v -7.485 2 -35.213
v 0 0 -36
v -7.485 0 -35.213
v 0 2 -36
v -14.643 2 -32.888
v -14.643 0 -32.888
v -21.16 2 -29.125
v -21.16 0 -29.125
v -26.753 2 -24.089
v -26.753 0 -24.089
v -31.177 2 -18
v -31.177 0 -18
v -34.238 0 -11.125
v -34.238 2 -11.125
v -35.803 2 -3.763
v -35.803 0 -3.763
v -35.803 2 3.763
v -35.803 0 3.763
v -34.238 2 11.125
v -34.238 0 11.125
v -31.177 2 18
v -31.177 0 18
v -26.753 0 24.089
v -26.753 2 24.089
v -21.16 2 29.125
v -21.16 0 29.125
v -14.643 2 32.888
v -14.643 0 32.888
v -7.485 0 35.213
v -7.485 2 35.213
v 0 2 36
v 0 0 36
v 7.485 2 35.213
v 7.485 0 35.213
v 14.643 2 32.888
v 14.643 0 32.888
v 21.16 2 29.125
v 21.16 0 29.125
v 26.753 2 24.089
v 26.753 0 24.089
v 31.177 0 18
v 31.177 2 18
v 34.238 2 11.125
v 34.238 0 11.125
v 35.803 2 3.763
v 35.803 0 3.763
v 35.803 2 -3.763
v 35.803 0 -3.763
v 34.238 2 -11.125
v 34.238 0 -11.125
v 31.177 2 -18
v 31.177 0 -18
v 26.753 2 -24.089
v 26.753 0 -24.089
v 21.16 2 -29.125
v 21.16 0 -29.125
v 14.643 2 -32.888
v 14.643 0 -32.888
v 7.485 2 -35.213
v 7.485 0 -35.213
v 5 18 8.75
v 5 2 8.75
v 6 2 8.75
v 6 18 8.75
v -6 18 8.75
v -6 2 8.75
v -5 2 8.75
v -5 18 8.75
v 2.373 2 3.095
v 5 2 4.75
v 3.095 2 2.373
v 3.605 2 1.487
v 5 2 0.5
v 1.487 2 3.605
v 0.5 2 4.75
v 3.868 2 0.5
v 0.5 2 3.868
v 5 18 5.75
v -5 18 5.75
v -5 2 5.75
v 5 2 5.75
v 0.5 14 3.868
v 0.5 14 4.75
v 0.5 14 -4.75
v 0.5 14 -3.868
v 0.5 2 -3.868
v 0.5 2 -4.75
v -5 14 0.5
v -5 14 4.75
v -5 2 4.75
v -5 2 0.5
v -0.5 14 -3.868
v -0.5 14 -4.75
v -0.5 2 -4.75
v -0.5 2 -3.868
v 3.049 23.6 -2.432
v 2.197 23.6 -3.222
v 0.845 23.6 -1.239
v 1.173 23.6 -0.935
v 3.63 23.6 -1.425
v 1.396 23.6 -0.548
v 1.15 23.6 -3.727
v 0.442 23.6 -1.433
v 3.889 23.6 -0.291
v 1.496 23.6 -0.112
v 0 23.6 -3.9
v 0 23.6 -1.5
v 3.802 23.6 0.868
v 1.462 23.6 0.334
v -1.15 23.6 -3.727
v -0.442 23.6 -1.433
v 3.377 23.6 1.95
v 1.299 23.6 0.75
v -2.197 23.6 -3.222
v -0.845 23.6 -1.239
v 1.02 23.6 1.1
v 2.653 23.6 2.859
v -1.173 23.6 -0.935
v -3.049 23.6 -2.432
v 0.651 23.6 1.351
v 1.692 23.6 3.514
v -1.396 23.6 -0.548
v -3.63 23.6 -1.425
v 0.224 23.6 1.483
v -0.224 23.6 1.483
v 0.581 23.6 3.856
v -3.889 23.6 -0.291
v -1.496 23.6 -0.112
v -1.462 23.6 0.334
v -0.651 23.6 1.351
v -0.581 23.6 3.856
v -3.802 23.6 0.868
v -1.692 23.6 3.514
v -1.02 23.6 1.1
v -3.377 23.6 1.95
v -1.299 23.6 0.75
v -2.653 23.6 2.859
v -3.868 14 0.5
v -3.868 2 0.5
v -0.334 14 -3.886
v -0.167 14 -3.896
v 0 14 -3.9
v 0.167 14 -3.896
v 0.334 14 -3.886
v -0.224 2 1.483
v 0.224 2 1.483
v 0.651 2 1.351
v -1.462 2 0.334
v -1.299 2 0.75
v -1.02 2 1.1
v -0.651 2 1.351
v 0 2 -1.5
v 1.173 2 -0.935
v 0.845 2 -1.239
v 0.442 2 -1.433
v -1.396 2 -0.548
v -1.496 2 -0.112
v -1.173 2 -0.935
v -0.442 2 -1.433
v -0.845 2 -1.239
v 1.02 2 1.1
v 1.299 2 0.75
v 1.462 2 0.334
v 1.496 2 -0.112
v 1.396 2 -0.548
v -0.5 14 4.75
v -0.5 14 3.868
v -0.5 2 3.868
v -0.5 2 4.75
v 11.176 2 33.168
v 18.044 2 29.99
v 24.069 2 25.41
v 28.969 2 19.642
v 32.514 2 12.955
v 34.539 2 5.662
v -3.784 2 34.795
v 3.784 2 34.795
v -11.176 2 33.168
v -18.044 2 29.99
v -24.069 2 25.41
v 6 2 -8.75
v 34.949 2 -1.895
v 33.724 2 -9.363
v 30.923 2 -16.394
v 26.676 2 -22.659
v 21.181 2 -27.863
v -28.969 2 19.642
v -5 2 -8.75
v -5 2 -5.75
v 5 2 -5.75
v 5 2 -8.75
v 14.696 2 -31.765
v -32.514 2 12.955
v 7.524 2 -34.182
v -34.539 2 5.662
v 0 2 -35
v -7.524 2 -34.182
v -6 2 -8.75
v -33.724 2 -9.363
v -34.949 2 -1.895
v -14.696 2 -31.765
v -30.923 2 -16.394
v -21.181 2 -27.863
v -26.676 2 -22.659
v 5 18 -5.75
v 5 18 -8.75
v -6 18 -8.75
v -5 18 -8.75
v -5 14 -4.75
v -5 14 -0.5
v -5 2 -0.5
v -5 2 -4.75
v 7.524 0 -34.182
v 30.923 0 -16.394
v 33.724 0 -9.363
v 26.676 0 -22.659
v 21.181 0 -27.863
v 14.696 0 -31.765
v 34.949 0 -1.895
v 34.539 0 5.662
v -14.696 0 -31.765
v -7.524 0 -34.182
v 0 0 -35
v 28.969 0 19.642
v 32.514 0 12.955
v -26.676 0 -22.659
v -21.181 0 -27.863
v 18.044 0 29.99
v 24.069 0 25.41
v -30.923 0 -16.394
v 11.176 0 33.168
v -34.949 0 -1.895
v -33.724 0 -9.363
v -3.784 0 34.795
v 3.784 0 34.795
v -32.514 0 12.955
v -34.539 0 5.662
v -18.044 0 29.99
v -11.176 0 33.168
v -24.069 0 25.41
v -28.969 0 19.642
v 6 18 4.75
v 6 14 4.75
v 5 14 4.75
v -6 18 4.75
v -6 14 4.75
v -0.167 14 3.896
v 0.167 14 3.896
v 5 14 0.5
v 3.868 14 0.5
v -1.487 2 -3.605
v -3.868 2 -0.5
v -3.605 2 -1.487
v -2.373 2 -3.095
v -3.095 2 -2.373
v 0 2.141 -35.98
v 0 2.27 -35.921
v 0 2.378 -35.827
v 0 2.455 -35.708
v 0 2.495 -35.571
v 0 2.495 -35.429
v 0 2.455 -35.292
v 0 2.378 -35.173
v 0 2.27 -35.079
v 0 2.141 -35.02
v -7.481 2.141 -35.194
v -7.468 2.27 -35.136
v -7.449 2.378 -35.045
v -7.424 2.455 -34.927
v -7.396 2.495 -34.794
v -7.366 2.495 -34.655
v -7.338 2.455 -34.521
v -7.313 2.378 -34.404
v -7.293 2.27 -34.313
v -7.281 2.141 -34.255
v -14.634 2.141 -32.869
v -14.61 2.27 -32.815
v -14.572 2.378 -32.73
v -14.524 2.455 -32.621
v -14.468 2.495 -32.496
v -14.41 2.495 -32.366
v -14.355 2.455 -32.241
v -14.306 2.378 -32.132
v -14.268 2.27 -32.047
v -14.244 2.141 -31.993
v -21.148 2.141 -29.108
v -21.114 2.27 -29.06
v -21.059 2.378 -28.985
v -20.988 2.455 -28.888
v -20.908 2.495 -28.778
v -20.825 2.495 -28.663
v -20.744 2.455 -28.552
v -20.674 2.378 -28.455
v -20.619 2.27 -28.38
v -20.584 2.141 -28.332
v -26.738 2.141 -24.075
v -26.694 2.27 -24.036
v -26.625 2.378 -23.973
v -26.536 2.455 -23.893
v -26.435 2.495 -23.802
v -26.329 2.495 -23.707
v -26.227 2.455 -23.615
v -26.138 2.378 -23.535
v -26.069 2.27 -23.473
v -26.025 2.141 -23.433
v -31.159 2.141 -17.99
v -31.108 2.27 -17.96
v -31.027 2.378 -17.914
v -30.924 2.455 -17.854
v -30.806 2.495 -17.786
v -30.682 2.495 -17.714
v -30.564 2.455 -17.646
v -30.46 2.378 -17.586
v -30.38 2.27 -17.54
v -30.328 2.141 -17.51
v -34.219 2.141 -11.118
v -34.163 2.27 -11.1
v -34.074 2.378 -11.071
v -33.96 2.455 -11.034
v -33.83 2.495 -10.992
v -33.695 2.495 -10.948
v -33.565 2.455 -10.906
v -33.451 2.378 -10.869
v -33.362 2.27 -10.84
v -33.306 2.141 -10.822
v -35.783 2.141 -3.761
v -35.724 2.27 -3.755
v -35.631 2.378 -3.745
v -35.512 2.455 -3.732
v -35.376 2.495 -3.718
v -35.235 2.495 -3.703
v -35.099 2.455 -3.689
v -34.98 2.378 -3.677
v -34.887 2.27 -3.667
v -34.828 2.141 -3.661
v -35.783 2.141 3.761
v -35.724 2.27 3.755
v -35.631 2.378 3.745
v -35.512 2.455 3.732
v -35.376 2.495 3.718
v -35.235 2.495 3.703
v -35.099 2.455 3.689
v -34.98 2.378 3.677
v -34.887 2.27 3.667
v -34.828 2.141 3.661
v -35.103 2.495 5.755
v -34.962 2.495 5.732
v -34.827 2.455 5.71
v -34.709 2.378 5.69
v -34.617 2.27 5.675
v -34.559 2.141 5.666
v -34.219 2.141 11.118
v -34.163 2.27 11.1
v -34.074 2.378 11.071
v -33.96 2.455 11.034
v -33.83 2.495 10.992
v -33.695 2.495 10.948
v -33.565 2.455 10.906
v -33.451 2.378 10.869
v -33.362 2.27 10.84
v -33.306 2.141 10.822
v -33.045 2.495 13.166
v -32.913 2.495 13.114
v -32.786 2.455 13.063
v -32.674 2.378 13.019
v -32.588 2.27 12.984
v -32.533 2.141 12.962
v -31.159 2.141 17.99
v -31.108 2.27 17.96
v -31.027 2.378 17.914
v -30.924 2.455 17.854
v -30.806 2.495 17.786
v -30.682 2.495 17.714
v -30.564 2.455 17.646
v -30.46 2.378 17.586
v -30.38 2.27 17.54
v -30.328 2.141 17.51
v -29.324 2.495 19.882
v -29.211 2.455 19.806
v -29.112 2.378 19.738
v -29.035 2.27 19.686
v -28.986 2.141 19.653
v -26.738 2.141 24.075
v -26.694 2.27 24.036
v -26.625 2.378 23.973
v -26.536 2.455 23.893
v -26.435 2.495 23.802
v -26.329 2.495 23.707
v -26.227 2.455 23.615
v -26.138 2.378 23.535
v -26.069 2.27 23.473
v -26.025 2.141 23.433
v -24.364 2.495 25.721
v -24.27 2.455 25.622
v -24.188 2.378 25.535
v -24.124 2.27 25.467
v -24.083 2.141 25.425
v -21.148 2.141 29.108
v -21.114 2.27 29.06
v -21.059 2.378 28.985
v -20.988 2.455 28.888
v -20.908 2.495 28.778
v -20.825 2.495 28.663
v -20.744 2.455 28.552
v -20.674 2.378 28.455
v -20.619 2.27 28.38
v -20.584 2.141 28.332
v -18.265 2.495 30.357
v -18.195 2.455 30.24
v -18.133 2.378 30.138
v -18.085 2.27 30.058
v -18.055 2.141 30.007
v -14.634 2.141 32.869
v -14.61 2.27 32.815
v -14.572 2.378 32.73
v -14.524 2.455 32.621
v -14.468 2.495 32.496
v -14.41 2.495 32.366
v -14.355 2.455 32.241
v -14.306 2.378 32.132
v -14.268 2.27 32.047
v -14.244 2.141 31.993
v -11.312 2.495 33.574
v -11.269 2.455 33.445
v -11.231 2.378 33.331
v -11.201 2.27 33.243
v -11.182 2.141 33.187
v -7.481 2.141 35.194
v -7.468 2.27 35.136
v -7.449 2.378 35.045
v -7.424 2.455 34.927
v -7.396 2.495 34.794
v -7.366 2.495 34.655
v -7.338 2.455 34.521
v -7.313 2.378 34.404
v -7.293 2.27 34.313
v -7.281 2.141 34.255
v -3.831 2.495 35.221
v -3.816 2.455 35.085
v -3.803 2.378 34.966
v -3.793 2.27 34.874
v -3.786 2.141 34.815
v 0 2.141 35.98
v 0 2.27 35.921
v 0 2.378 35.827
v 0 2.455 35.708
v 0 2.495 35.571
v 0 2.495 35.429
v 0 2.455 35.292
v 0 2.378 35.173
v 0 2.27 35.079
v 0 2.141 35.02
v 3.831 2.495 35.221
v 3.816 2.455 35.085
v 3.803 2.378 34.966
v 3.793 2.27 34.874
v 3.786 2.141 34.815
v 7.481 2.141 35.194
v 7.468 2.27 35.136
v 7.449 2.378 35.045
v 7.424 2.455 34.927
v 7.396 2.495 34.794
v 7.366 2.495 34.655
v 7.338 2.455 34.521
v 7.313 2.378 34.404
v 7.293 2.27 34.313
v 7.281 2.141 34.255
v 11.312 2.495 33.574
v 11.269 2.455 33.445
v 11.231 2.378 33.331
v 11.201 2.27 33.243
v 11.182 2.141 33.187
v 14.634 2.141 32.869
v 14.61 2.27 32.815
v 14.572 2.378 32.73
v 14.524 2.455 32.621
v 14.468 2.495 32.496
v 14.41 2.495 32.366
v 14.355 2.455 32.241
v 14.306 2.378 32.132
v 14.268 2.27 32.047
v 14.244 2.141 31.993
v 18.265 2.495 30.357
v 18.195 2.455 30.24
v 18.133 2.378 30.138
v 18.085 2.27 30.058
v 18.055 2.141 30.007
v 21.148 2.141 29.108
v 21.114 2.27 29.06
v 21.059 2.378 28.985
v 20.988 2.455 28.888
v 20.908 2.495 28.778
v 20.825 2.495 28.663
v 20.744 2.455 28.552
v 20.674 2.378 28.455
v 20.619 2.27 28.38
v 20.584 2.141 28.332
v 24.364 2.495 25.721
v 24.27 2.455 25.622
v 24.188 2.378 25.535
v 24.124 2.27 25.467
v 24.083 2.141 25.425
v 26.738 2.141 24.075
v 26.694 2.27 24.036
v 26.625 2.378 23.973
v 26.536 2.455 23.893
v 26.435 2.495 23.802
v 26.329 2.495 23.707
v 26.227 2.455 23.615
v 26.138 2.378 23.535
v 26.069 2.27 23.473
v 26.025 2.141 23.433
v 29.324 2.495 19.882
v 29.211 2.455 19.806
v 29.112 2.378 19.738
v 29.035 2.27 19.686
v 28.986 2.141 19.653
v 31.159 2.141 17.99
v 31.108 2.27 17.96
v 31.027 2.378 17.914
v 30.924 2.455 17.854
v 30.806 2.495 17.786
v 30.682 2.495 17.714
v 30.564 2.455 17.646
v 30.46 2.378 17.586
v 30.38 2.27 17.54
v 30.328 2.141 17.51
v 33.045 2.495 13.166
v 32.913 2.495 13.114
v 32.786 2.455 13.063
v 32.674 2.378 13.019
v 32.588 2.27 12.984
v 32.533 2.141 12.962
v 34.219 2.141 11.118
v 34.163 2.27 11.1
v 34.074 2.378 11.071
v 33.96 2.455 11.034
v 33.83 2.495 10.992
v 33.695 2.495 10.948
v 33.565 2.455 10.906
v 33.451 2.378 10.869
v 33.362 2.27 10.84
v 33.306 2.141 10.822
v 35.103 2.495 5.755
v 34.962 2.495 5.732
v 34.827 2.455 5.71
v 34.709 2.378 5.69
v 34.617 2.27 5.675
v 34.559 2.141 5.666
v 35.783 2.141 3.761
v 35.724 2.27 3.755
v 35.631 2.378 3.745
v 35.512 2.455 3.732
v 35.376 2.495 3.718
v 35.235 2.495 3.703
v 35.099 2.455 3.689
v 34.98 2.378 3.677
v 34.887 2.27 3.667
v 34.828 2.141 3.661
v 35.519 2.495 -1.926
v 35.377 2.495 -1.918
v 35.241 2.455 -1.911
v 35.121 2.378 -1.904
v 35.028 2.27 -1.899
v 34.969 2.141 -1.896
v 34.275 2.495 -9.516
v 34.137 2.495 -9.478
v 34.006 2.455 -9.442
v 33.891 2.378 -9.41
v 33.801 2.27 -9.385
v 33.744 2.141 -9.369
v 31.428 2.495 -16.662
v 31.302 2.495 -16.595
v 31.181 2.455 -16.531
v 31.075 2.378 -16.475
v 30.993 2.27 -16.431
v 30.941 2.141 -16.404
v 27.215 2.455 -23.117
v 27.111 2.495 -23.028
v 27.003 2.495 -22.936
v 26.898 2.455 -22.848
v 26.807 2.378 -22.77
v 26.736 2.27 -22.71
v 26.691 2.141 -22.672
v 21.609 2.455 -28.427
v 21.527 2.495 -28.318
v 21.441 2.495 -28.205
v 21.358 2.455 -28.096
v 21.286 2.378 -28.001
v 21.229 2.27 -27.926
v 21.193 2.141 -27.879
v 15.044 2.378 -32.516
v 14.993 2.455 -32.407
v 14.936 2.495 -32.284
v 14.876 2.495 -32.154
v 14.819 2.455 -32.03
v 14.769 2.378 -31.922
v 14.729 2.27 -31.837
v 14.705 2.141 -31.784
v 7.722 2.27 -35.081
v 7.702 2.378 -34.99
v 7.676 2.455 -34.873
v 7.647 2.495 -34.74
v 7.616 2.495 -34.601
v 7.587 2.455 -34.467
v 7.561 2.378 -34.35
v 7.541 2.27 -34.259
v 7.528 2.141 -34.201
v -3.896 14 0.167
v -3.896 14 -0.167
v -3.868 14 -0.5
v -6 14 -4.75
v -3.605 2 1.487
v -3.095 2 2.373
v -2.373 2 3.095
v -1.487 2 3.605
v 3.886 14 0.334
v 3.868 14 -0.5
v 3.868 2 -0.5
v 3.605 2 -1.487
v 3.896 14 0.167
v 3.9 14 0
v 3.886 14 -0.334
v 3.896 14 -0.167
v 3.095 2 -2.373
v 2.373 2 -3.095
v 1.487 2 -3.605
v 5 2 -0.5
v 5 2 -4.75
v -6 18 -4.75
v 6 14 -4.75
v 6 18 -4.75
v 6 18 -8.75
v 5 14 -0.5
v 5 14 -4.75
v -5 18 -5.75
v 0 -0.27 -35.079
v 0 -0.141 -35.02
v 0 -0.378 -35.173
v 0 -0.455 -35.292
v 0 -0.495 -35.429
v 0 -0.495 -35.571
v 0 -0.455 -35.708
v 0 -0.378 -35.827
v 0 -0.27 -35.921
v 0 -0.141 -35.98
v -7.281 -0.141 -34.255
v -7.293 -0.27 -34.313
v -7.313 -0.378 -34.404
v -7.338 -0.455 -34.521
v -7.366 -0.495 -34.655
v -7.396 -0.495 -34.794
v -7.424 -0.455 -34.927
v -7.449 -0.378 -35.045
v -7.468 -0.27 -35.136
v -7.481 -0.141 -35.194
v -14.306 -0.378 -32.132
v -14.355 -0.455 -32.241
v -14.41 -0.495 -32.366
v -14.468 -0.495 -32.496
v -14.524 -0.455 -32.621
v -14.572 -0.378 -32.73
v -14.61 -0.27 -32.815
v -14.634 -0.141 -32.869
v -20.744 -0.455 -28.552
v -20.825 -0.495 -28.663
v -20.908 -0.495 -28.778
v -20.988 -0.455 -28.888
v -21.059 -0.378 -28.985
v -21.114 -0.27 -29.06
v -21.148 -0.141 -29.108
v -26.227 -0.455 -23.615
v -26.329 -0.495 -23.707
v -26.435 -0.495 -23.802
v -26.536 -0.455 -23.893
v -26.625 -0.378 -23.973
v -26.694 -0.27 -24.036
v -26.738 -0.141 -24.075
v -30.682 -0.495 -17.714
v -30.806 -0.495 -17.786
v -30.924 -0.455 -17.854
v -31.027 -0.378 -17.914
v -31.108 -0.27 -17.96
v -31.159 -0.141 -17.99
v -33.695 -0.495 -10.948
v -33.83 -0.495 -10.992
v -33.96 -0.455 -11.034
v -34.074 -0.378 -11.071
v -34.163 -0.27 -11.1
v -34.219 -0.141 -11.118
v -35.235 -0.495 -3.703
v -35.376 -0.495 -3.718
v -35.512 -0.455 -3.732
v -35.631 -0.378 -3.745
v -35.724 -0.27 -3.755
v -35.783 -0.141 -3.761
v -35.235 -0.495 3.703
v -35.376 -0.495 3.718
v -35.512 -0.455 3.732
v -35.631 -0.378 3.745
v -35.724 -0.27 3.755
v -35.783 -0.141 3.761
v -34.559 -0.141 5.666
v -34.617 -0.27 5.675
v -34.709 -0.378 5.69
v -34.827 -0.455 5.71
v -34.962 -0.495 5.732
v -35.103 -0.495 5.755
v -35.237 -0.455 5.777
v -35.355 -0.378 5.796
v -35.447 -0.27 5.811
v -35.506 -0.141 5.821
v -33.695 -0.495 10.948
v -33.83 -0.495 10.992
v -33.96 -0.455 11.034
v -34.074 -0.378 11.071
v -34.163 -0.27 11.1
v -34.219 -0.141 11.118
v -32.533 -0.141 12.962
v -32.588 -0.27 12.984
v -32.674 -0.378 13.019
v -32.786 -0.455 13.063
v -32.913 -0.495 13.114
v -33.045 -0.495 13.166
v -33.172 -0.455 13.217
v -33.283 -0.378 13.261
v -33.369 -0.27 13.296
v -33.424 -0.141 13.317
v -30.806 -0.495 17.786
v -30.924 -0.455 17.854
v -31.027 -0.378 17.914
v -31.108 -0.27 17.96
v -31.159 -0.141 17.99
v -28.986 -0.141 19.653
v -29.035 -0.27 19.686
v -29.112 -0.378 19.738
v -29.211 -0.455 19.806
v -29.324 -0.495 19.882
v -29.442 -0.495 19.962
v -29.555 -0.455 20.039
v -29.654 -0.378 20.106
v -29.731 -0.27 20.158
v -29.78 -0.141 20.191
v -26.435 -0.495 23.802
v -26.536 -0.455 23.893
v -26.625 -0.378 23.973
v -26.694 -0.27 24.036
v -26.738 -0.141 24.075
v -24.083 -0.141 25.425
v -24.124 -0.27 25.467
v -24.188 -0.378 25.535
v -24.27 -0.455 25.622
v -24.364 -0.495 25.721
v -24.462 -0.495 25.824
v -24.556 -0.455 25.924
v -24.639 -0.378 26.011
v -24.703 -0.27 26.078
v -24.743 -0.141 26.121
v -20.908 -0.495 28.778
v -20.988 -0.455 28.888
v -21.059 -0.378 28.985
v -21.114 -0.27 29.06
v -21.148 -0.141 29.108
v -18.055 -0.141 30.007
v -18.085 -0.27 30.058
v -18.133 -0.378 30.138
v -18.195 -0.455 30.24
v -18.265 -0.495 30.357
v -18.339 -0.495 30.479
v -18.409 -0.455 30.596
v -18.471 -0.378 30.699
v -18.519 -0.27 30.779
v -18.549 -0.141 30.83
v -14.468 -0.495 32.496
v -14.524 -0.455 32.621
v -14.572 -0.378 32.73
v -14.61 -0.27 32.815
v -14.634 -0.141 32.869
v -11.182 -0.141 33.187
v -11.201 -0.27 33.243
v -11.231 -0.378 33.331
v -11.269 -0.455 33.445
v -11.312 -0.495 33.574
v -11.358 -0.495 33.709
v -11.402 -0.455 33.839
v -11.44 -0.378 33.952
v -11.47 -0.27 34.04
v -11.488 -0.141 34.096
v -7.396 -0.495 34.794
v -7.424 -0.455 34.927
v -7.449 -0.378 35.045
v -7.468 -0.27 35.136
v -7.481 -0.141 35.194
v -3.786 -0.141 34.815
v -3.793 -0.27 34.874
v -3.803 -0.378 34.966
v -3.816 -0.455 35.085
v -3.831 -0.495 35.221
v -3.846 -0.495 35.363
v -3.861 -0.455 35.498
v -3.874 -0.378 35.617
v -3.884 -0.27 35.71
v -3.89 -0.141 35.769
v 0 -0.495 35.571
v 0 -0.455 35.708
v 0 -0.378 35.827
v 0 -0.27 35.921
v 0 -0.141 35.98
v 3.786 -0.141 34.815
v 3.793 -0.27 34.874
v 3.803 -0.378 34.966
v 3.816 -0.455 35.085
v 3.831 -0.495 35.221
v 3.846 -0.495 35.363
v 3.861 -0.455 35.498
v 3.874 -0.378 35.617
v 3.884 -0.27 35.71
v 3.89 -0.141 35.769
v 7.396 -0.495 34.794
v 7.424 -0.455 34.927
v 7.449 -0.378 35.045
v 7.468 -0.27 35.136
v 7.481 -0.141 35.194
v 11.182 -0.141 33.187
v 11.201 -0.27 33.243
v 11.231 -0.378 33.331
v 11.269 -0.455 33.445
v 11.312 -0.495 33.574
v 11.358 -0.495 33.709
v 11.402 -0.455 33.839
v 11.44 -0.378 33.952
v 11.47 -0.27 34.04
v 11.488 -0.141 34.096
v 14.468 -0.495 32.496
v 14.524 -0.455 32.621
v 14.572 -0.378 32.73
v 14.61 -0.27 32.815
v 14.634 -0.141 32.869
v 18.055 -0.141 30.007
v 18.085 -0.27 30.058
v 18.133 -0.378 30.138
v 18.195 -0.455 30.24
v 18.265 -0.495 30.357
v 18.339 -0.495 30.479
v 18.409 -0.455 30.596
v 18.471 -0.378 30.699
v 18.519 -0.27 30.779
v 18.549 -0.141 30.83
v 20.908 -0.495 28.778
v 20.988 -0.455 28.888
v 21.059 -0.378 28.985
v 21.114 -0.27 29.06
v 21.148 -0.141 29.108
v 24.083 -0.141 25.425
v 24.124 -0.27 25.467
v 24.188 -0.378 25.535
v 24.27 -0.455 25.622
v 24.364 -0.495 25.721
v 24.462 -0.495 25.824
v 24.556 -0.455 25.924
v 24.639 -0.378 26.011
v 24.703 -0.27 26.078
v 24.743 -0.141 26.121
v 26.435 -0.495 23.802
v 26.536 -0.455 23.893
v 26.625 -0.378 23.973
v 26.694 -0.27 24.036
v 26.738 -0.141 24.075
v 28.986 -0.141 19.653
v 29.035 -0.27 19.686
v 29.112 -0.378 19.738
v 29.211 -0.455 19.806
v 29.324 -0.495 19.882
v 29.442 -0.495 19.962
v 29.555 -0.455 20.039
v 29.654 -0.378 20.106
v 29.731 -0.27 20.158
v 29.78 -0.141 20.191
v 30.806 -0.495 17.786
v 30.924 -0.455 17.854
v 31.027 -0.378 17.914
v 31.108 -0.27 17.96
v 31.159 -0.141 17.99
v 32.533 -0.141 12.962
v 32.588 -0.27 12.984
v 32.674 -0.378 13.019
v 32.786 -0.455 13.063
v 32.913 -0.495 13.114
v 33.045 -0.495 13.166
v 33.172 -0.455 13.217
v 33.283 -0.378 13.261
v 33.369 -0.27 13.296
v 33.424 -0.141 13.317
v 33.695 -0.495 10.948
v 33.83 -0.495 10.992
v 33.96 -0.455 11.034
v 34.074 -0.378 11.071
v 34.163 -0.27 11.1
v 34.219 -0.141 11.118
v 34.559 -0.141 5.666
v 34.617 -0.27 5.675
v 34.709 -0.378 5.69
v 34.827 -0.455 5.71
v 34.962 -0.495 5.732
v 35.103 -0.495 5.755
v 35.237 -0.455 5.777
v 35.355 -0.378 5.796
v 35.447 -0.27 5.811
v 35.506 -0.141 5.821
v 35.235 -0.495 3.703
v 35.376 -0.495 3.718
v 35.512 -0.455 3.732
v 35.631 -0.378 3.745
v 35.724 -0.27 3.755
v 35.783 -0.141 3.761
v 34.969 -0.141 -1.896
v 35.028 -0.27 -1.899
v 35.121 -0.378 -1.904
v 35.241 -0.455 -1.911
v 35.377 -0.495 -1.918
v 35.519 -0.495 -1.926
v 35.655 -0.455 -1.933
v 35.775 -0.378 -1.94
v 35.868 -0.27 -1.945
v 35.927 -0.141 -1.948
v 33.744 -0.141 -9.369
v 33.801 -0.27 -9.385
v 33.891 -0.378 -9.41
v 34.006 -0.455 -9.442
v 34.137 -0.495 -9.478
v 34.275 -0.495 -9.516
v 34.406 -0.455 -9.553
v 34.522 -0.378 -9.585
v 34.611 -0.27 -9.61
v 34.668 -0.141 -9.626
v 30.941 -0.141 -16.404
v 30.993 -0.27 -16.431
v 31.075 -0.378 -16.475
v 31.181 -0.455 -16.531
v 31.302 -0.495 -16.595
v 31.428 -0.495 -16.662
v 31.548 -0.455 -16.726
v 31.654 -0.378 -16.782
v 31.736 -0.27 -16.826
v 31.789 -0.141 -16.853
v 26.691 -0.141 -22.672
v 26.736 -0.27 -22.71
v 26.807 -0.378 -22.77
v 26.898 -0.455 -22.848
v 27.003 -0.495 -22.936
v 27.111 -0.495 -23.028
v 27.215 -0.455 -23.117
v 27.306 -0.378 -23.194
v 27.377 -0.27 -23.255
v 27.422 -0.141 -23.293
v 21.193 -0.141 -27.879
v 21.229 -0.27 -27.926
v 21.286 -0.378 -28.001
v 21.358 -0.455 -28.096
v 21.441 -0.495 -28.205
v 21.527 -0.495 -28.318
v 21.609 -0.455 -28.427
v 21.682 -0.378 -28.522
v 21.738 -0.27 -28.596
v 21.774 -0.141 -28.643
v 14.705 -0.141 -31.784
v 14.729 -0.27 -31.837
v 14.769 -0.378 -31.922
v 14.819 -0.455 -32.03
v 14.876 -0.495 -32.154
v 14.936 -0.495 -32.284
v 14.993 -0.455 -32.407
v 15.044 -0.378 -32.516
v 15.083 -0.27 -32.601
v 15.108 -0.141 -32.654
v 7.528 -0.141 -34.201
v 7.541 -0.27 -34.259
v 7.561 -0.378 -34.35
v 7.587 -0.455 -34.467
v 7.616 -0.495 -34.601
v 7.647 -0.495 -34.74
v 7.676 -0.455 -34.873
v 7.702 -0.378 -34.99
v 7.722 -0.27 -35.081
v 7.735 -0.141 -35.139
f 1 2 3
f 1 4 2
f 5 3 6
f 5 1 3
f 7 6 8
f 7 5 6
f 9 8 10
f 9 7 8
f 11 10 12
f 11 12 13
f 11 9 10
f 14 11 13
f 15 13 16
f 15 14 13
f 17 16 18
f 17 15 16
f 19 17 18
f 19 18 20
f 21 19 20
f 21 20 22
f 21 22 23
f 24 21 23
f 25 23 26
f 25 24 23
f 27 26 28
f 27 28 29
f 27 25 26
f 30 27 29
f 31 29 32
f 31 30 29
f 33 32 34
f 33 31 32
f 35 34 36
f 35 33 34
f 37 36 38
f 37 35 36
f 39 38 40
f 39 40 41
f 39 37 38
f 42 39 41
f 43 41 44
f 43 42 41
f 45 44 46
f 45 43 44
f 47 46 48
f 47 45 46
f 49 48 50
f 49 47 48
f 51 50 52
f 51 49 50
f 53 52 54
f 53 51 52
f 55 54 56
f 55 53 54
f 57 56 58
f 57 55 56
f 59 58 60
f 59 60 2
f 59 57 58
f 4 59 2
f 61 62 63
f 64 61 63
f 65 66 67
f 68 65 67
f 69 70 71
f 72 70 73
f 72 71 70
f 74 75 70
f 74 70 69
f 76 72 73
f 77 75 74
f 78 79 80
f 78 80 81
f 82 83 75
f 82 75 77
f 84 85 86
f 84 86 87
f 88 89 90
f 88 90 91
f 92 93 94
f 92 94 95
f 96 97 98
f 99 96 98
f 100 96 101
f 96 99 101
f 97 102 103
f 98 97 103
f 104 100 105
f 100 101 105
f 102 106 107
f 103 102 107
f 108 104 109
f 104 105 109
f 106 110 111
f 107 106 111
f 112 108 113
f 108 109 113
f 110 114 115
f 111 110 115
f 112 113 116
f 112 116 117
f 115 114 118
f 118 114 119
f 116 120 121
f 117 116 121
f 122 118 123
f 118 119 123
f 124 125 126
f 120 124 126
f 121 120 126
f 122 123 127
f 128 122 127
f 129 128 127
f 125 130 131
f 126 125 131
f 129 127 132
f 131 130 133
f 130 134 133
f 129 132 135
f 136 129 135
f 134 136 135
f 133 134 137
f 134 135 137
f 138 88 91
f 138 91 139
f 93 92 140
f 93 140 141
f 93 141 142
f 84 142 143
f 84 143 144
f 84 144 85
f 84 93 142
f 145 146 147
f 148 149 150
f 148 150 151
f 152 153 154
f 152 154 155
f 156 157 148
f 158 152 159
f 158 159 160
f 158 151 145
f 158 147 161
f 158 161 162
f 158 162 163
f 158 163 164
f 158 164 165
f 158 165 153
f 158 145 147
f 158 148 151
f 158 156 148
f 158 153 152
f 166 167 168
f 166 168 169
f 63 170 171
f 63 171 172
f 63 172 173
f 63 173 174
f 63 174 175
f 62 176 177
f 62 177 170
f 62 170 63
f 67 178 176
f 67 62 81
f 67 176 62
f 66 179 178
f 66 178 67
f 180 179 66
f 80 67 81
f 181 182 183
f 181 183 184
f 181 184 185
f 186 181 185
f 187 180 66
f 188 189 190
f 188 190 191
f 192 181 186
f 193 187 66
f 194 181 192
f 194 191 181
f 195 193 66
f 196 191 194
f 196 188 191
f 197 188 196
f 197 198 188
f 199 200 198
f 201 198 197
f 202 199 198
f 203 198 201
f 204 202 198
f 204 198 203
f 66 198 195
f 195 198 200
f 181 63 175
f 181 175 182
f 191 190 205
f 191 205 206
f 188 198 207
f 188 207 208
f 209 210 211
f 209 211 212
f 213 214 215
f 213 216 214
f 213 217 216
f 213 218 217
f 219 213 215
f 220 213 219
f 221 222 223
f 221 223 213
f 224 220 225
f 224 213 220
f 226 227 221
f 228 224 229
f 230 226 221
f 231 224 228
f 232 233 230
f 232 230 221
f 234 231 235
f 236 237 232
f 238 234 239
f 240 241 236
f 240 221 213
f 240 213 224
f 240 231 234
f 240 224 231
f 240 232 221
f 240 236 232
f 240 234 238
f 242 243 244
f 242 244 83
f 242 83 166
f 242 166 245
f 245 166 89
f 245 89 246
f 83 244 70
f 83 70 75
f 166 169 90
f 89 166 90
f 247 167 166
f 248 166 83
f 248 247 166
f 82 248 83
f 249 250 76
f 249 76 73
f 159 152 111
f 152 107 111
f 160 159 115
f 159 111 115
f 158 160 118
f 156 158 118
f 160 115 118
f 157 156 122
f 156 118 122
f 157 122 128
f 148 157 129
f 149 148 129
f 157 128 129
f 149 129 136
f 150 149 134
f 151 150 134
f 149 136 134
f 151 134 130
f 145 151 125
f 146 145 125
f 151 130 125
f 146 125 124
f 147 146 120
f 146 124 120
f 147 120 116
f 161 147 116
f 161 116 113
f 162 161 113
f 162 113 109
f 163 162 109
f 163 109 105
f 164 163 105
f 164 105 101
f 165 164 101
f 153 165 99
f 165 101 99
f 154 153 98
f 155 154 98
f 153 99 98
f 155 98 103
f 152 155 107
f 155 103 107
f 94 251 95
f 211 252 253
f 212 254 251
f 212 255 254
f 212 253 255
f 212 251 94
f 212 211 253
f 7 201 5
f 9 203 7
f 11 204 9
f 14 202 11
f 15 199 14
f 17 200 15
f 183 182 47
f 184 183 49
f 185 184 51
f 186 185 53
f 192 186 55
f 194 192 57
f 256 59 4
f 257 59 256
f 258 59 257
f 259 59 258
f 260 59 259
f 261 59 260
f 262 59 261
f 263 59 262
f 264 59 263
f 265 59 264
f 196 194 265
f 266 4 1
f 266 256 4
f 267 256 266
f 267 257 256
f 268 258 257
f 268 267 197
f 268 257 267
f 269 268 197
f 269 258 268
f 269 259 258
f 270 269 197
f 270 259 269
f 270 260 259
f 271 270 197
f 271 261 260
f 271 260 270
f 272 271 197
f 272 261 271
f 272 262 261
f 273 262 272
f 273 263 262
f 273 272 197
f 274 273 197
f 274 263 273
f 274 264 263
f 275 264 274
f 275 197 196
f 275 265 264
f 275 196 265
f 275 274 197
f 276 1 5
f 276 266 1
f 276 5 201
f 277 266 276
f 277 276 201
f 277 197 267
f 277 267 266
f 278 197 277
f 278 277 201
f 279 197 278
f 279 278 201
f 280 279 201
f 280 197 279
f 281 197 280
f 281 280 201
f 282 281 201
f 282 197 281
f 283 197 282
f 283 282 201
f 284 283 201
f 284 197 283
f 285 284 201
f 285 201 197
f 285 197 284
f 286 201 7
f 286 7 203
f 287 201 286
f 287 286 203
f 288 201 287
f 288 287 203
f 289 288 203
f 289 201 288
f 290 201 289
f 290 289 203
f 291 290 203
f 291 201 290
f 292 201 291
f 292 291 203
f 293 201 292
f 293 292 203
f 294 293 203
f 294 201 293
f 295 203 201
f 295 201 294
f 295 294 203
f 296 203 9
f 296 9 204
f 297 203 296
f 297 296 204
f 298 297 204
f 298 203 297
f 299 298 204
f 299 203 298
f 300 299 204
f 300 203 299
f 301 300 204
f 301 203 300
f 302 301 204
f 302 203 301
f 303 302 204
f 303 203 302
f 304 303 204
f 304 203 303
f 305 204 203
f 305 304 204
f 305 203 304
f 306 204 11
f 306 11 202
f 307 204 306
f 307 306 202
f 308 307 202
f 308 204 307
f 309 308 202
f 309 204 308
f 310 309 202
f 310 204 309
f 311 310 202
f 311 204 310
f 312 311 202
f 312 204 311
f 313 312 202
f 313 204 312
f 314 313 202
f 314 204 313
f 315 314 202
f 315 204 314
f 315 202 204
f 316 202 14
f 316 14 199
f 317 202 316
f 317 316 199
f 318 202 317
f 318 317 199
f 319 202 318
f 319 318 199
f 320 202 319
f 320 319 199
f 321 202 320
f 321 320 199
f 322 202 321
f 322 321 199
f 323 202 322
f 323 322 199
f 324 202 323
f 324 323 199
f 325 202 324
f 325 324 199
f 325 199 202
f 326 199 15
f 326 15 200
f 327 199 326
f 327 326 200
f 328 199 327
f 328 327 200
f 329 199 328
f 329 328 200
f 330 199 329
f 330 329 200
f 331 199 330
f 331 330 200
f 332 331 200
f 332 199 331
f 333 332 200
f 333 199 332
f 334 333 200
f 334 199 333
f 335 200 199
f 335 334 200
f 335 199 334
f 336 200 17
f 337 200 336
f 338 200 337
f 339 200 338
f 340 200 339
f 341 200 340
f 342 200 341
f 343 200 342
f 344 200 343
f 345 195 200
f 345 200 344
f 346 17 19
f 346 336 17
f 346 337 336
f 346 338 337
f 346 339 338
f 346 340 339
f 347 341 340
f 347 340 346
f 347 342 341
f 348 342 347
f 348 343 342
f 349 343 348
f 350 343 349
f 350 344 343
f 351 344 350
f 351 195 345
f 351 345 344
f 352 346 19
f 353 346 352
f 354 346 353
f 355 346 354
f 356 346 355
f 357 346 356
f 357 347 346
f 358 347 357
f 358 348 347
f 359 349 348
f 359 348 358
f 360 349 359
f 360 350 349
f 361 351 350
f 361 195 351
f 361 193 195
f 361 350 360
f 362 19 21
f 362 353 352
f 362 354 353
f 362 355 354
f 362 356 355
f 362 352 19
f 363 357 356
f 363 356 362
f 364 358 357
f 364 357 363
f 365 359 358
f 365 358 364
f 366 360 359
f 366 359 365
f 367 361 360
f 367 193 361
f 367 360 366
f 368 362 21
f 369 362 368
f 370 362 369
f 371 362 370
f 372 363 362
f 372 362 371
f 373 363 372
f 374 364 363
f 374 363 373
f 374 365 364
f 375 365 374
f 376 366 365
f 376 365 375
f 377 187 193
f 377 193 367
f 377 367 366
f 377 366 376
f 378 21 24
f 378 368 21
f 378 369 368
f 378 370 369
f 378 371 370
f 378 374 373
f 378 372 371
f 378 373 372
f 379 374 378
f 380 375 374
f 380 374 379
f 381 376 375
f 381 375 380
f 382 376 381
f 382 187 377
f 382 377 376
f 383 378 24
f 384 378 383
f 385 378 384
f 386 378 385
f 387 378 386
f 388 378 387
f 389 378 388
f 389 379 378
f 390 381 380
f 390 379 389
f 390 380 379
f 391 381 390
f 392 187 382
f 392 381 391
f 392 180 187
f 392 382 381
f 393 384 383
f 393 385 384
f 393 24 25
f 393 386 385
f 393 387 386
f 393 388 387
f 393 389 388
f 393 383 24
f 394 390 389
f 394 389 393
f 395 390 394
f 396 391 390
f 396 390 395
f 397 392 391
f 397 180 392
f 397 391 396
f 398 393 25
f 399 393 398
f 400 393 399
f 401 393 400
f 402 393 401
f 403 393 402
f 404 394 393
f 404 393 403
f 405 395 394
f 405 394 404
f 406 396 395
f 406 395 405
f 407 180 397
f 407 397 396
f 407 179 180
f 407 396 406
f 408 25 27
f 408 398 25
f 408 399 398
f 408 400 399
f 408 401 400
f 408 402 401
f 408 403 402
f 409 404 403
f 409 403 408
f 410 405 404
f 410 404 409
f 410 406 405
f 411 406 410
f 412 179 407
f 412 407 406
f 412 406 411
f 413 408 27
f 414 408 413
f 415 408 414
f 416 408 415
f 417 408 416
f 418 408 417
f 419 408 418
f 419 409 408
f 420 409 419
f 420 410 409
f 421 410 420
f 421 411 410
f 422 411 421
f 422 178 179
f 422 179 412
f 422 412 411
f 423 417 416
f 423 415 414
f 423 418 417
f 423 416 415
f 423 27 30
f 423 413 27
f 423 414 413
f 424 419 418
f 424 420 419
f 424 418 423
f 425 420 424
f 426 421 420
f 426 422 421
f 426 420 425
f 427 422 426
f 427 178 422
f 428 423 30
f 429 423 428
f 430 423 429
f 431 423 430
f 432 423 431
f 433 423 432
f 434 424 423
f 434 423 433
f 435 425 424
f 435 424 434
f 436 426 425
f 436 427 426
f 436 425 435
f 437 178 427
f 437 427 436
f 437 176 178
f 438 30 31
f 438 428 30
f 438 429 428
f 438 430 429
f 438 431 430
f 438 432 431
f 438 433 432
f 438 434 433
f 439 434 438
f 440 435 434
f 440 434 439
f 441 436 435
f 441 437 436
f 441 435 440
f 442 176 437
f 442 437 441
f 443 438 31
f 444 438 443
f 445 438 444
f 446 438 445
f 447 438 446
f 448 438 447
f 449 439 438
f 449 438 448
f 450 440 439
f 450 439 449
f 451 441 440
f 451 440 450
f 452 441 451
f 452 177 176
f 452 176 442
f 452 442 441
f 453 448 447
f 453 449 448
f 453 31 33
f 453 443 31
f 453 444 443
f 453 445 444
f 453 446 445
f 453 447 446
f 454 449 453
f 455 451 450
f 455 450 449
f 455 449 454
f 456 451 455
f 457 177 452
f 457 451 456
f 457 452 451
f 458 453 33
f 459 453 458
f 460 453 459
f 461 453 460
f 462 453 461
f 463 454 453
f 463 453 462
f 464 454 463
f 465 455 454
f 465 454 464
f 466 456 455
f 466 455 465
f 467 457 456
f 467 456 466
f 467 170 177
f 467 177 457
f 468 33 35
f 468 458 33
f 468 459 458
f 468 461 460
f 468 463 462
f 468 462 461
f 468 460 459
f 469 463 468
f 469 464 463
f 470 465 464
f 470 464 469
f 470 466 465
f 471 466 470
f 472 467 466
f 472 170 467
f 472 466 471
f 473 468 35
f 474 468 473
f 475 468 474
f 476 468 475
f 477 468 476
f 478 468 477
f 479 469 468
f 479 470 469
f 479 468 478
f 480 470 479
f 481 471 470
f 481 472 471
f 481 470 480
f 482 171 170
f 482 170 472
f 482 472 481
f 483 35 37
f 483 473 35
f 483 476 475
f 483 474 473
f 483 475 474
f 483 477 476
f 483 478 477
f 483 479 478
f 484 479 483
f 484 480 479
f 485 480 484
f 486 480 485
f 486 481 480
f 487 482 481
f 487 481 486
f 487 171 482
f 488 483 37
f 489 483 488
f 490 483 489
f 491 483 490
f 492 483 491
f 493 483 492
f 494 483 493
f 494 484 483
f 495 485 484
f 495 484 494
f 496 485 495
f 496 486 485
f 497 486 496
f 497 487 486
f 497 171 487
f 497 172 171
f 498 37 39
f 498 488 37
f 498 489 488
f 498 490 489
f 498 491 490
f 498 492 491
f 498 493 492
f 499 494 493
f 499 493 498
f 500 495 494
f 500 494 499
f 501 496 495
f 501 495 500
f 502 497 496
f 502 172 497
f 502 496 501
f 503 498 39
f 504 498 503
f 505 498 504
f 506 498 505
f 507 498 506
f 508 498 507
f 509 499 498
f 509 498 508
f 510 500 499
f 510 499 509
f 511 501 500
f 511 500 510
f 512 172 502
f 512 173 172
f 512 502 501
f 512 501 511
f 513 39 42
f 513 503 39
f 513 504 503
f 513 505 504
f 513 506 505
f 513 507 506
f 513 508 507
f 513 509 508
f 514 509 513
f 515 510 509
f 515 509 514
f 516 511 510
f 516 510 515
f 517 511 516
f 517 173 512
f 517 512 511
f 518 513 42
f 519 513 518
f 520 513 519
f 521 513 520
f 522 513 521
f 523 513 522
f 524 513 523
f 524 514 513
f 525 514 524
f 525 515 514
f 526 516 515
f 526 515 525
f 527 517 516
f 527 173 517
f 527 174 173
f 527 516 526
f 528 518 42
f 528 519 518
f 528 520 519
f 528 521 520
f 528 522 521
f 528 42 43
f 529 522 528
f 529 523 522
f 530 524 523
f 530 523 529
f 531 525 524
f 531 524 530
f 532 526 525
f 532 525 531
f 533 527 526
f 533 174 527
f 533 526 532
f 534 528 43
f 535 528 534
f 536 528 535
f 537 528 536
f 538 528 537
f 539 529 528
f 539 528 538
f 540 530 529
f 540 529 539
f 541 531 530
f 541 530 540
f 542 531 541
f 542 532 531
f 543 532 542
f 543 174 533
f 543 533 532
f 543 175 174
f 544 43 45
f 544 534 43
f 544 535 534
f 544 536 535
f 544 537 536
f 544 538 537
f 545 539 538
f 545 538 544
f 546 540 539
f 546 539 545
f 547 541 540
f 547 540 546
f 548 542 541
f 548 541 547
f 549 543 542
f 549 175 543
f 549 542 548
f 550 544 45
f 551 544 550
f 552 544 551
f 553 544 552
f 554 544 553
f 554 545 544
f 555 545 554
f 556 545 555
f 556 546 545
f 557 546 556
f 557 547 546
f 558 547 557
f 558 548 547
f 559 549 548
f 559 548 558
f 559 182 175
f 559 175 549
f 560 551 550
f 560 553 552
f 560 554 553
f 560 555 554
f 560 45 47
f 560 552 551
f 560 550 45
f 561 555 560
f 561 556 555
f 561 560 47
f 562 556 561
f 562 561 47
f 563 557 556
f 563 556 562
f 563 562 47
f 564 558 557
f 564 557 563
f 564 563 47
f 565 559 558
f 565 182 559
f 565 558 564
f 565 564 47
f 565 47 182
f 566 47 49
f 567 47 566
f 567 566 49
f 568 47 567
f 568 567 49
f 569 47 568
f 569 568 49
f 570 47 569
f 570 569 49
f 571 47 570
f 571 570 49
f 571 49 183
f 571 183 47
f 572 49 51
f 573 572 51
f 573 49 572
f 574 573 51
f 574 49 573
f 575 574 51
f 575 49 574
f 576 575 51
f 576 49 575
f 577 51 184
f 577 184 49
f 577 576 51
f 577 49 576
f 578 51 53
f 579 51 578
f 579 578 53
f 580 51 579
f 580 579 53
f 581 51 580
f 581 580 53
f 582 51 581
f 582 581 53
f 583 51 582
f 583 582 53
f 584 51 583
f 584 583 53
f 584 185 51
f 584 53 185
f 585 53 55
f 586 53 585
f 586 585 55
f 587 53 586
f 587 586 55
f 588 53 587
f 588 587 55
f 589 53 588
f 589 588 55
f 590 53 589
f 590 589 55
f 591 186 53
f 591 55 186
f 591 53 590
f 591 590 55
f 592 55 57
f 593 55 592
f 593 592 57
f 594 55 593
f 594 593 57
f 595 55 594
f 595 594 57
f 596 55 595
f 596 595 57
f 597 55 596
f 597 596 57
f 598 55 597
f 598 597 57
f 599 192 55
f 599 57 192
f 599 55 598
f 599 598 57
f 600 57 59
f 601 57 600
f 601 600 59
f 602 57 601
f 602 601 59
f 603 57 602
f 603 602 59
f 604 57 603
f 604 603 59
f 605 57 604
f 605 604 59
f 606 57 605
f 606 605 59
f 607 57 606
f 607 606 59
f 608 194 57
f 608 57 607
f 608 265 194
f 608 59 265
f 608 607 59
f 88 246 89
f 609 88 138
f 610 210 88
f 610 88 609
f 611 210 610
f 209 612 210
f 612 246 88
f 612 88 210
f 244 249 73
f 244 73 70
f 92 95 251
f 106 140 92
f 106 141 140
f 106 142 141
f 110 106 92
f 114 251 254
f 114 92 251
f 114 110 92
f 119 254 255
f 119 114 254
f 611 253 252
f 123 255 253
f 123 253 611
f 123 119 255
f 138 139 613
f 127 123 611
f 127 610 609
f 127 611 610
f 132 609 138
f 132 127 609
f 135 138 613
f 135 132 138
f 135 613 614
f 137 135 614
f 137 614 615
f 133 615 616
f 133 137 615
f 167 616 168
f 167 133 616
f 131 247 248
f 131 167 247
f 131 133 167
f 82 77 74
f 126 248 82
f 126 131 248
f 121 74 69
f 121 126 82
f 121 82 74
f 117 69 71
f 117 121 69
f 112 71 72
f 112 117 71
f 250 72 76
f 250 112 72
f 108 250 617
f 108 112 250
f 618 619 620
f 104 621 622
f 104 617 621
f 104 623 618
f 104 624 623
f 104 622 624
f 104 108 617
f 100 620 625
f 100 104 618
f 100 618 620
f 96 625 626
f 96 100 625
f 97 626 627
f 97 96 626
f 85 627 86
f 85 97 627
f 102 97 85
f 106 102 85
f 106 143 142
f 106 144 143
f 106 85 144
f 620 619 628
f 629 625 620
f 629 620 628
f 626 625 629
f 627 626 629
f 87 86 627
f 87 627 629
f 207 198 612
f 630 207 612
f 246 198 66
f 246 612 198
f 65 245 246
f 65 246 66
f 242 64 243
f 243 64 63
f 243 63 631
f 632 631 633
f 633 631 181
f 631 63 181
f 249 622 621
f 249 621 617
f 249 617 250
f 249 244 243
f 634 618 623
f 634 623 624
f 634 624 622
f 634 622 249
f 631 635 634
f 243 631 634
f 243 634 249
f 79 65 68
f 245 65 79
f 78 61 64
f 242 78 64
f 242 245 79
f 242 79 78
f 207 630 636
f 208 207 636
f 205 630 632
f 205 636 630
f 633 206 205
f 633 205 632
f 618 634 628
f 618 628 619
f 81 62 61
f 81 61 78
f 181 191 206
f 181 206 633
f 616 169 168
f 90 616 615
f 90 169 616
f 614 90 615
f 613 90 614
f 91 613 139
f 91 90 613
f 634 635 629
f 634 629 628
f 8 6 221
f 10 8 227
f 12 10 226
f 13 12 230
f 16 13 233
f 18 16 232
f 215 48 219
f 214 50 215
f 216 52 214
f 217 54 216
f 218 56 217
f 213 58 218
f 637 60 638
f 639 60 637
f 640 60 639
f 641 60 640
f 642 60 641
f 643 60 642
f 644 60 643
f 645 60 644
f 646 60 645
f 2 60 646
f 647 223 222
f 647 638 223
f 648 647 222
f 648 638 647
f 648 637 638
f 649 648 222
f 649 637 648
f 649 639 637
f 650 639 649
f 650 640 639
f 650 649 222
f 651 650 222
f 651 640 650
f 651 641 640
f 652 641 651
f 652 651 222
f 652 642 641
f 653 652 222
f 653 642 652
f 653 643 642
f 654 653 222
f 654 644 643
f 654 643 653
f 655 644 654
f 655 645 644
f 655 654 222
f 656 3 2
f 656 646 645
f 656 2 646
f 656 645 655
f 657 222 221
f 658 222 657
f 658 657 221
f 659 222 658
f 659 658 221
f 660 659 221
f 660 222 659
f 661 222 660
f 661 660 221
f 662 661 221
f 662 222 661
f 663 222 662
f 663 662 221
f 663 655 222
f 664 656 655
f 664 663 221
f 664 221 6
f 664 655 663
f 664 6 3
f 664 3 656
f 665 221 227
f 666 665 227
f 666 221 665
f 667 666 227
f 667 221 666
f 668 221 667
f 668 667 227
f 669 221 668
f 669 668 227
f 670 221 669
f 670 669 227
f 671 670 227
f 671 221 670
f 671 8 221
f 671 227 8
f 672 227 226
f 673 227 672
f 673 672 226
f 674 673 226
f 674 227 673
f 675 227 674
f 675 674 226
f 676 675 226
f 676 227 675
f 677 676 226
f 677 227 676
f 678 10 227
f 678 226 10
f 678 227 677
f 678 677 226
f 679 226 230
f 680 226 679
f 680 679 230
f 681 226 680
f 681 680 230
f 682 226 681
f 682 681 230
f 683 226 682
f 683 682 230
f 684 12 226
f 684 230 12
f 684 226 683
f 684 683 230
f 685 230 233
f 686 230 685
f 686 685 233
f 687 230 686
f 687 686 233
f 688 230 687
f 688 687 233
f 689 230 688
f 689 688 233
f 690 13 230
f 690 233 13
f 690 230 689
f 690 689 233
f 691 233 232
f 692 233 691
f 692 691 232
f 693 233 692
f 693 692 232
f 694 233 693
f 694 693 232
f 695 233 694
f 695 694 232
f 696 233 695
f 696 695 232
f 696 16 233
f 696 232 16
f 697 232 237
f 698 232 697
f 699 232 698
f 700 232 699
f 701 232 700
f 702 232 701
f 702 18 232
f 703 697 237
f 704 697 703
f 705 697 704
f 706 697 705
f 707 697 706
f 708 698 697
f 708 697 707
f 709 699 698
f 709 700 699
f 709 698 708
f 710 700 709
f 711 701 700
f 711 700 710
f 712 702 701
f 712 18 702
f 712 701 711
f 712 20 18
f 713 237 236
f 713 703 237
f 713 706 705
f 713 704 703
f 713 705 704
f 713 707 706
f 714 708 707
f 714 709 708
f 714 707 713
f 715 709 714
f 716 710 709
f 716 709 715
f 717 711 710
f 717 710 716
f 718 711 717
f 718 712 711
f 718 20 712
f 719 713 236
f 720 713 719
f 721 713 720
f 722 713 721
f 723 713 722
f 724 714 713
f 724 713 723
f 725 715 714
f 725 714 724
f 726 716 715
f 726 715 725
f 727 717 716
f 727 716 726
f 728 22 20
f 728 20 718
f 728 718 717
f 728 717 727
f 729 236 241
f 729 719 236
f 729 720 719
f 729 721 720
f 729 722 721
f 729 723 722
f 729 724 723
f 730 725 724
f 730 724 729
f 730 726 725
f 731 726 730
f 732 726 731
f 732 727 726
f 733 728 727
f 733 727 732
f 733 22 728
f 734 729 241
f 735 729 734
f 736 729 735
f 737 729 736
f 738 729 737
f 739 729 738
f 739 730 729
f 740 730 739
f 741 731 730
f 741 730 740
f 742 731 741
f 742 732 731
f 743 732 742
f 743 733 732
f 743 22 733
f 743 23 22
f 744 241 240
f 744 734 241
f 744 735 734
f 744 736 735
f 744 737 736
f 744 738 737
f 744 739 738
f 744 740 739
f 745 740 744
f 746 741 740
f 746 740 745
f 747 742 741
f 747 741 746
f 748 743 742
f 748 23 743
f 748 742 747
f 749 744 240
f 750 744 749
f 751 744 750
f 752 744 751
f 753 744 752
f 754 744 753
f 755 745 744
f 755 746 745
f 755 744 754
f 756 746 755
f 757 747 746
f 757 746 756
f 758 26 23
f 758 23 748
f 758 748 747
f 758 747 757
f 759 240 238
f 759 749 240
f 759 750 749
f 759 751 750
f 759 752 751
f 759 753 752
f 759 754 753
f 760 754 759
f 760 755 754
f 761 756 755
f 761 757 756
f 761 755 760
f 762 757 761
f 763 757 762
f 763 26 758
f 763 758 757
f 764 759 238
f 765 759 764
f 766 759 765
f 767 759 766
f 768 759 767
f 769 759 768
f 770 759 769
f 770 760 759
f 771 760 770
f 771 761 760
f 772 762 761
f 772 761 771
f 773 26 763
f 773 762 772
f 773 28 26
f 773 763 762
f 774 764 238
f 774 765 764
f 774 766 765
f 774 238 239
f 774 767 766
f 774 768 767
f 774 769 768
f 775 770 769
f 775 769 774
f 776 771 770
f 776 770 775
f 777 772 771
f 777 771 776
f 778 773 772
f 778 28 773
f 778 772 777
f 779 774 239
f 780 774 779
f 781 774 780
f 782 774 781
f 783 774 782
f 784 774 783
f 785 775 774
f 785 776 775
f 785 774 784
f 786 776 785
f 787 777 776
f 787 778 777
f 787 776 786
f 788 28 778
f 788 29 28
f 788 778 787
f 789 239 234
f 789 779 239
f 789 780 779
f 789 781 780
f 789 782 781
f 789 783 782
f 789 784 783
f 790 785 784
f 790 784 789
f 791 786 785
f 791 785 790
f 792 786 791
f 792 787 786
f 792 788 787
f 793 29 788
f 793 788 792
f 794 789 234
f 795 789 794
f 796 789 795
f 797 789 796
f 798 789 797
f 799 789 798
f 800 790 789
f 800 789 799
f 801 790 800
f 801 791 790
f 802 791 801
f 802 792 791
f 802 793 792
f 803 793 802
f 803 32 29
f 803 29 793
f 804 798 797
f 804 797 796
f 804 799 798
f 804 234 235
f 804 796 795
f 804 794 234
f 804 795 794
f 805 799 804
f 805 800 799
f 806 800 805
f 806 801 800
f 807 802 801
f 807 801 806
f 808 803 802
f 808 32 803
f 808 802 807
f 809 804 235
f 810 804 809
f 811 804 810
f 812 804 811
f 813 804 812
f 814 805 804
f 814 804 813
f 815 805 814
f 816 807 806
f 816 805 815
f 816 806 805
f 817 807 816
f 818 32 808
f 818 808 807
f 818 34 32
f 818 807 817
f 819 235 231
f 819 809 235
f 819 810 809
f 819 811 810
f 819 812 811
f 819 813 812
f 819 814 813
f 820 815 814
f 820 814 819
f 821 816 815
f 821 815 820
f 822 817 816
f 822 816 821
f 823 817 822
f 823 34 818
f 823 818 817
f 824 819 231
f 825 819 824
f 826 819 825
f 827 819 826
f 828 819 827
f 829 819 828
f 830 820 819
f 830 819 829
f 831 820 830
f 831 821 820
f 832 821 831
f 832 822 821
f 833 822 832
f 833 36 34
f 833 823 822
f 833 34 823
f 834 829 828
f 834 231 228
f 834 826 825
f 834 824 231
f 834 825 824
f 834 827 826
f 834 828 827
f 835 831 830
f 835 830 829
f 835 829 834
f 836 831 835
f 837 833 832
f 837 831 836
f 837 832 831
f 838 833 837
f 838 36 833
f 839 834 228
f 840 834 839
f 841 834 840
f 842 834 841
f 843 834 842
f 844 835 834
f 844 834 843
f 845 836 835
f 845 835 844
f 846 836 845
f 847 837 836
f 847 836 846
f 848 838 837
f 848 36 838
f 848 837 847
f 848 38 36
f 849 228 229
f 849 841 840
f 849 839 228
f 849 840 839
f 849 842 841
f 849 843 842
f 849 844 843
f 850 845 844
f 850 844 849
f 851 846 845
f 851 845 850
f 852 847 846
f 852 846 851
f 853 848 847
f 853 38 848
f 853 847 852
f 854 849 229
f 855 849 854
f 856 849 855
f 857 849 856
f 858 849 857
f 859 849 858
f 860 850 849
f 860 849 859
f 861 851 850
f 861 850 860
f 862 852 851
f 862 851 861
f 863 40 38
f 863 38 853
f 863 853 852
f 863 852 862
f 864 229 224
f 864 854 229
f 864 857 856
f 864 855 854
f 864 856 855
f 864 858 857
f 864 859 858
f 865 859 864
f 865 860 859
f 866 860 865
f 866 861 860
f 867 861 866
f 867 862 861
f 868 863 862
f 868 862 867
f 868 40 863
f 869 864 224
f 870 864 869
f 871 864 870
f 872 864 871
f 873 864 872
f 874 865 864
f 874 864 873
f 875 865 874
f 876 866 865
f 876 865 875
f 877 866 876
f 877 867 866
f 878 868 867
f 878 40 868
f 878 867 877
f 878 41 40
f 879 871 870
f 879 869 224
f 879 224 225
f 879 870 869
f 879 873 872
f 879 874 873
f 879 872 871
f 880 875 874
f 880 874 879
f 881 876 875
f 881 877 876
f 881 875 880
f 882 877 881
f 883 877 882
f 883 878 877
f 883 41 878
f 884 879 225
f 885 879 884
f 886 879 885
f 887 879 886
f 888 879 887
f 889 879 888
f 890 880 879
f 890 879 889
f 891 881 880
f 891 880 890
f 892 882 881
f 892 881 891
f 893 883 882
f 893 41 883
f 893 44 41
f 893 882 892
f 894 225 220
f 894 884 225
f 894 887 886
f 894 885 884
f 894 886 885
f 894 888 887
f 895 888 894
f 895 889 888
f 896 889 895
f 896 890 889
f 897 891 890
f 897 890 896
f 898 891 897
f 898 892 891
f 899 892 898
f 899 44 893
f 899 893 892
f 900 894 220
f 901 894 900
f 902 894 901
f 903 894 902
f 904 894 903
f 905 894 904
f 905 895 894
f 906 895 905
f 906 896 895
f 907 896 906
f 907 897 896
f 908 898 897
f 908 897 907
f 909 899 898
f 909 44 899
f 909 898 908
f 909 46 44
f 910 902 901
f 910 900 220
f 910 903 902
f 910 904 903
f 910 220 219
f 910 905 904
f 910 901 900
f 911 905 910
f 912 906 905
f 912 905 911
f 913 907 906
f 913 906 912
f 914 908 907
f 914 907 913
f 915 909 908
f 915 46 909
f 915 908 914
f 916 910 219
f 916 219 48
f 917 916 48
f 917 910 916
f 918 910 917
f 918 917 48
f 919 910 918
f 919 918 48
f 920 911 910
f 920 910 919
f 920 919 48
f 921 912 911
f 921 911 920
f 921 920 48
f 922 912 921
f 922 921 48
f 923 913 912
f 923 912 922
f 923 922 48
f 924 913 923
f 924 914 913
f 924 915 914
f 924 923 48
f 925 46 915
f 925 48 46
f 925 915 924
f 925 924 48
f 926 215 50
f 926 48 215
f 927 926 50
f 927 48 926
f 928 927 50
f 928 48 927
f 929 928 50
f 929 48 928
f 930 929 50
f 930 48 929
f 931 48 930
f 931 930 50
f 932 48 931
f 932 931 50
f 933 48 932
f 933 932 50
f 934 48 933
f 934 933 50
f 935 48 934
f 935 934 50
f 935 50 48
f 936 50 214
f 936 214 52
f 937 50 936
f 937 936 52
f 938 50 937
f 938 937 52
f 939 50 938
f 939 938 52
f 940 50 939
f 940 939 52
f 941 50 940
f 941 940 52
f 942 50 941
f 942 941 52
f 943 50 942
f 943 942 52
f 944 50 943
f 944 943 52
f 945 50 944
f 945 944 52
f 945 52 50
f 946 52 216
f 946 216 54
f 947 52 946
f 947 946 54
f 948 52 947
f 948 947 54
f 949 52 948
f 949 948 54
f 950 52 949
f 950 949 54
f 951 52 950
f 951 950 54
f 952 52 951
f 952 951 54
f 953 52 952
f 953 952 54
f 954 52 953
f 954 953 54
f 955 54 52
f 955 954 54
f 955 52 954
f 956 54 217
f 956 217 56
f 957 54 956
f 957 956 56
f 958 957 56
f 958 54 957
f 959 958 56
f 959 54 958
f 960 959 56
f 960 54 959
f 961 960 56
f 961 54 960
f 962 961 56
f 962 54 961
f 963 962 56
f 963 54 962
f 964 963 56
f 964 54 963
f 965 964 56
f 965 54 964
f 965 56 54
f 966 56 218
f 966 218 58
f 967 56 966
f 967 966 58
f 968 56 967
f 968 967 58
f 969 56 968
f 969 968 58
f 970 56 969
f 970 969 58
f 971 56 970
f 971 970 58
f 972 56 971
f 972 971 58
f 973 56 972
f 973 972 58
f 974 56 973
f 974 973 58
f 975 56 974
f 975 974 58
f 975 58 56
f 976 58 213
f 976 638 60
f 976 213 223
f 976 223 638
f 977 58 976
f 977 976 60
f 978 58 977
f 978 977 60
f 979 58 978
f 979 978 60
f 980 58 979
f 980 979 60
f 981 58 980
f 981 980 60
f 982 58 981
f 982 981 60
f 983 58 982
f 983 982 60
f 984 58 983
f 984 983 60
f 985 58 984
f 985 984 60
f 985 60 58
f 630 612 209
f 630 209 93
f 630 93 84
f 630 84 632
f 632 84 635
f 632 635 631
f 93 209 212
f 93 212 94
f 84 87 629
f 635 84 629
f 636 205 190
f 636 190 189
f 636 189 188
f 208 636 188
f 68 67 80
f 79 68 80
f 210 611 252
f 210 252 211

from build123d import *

# Parameters (mm, degrees)
SKETCH_3_W      = 2.4
SKETCH_3_H      = 21.6
SKETCH_4_W      = 1
SKETCH_4_H      = 3
EXTRUDE_1_DEPTH = 16
EXTRUDE_START   = 12
EXTRUDE_2_DEPTH = 12


with BuildPart() as part:
    # 草图3 → 旋转2 (revolve)
    with BuildSketch(Plane.XY, mode=Mode.PRIVATE) as revolve_2_sk:
        with Locations((2.7, 12.8)):
            Rectangle(SKETCH_3_W, SKETCH_3_H)
        Polygon((0, 2), (0, 0), (35, 0), (35, 2), (3.9, 2), (1.5, 2), align=None)
        with BuildLine():
            ThreePointArc((36, 2), (35.5, 2.5), (35, 2))
            Line((35, 2), (36, 2))
        make_face()
        with BuildLine():
            Line((36, 2), (35, 2))
            ThreePointArc((35, 2), (35.5, 1.5), (36, 2))
        make_face()
        with BuildLine():
            ThreePointArc((36, 2), (35.5, 2.5), (35, 2))
            Line((35, 2), (36, 2))
        make_face()
        with BuildLine():
            Line((36, 2), (35, 2))
            ThreePointArc((35, 2), (35.5, 1.5), (36, 2))
        make_face()
        with BuildLine():
            Line((35, 2), (35, 0))
            ThreePointArc((35, 0), (35.5, 0.5), (36, 0))
            Line((36, 0), (36, 2))
            ThreePointArc((36, 2), (35.5, 1.5), (35, 2))
        make_face()
        with BuildLine():
            ThreePointArc((36, 0), (35.5, 0.5), (35, 0))
            Line((35, 0), (36, 0))
        make_face()
        with BuildLine():
            Line((36, 0), (35, 0))
            ThreePointArc((35, 0), (35.5, -0.5), (36, 0))
        make_face()
        with BuildLine():
            ThreePointArc((36, 0), (35.5, 0.5), (35, 0))
            Line((35, 0), (36, 0))
        make_face()
        with BuildLine():
            Line((36, 0), (35, 0))
            ThreePointArc((35, 0), (35.5, -0.5), (36, 0))
        make_face()
    revolve(revolve_2_sk.sketch.rotate(Axis((0, 2, 0), (0, 1, 0)), 90), axis=Axis((0, 2, 0), (0, 1, 0)))

    # 草图4 → 凸台-拉伸1 (add)
    with BuildSketch(Plane(origin=(0, 2, 0), x_dir=(1, 0, 0), z_dir=(0, 1, 0))):
        with Locations((-5.5, 7.25)):
            Rectangle(SKETCH_4_W, SKETCH_4_H)
        Polygon((-6, 4.75), (-5, 4.75), (5, 4.75), (6, 4.75), (6, 5.75), (5, 5.75), (-5, 5.75), (-6, 5.75), align=None)
        with Locations((5.5, 7.25)):
            Rectangle(SKETCH_4_W, SKETCH_4_H)
        Polygon((5, -4.75), (-5, -4.75), (-6, -4.75), (-6, -5.75), (-5, -5.75), (5, -5.75), (6, -5.75), (6, -4.75), align=None)
        with Locations((-5.5, -7.25)):
            Rectangle(SKETCH_4_W, SKETCH_4_H)
        with Locations((5.5, -7.25)):
            Rectangle(SKETCH_4_W, SKETCH_4_H)
    extrude(amount=EXTRUDE_1_DEPTH)

    # 草图6 → 凸台-拉伸2 (add)
    with BuildSketch(Plane(origin=(0, 2, 0), x_dir=(1, 0, 0), z_dir=(0, 1, 0)).offset(EXTRUDE_START)):
        Polygon((-5, -0.5), (-5, 0.5), (-5, 4.75), (-6, 4.75), (-6, -4.75), (-5, -4.75), align=None)
        with BuildLine():
            ThreePointArc((0.5, -3.867815921), (0, -3.9), (-0.5, -3.867815921))
            Line((-0.5, -3.867815921), (-0.5, -4.75))
            Line((-0.5, -4.75), (0.5, -4.75))
            Line((0.5, -4.75), (0.5, -3.867815921))
        make_face()
        with BuildLine():
            Line((-0.5, 4.75), (-0.5, 3.867815921))
            ThreePointArc((-0.5, 3.867815921), (0, 3.9), (0.5, 3.867815921))
            Line((0.5, 3.867815921), (0.5, 4.75))
            Line((0.5, 4.75), (-0.5, 4.75))
        make_face()
        with BuildLine():
            ThreePointArc((-3.867815921, -0.5), (-3.9, 0), (-3.867815921, 0.5))
            Line((-3.867815921, 0.5), (-5, 0.5))
            Line((-5, 0.5), (-5, -0.5))
            Line((-5, -0.5), (-3.867815921, -0.5))
        make_face()
        with BuildLine():
            Line((5, 0.5), (3.867815921, 0.5))
            ThreePointArc((3.867815921, 0.5), (3.891945663, 0.250517372), (3.9, 0))
            ThreePointArc((3.9, 0), (3.891945663, -0.250517372), (3.867815921, -0.5))
            Line((3.867815921, -0.5), (5, -0.5))
            Line((5, -0.5), (5, 0.5))
        make_face()
        Polygon((6, 4.75), (5, 4.75), (5, 0.5), (5, -0.5), (5, -4.75), (6, -4.75), align=None)
    extrude(amount=-EXTRUDE_2_DEPTH)


solid = part.part
